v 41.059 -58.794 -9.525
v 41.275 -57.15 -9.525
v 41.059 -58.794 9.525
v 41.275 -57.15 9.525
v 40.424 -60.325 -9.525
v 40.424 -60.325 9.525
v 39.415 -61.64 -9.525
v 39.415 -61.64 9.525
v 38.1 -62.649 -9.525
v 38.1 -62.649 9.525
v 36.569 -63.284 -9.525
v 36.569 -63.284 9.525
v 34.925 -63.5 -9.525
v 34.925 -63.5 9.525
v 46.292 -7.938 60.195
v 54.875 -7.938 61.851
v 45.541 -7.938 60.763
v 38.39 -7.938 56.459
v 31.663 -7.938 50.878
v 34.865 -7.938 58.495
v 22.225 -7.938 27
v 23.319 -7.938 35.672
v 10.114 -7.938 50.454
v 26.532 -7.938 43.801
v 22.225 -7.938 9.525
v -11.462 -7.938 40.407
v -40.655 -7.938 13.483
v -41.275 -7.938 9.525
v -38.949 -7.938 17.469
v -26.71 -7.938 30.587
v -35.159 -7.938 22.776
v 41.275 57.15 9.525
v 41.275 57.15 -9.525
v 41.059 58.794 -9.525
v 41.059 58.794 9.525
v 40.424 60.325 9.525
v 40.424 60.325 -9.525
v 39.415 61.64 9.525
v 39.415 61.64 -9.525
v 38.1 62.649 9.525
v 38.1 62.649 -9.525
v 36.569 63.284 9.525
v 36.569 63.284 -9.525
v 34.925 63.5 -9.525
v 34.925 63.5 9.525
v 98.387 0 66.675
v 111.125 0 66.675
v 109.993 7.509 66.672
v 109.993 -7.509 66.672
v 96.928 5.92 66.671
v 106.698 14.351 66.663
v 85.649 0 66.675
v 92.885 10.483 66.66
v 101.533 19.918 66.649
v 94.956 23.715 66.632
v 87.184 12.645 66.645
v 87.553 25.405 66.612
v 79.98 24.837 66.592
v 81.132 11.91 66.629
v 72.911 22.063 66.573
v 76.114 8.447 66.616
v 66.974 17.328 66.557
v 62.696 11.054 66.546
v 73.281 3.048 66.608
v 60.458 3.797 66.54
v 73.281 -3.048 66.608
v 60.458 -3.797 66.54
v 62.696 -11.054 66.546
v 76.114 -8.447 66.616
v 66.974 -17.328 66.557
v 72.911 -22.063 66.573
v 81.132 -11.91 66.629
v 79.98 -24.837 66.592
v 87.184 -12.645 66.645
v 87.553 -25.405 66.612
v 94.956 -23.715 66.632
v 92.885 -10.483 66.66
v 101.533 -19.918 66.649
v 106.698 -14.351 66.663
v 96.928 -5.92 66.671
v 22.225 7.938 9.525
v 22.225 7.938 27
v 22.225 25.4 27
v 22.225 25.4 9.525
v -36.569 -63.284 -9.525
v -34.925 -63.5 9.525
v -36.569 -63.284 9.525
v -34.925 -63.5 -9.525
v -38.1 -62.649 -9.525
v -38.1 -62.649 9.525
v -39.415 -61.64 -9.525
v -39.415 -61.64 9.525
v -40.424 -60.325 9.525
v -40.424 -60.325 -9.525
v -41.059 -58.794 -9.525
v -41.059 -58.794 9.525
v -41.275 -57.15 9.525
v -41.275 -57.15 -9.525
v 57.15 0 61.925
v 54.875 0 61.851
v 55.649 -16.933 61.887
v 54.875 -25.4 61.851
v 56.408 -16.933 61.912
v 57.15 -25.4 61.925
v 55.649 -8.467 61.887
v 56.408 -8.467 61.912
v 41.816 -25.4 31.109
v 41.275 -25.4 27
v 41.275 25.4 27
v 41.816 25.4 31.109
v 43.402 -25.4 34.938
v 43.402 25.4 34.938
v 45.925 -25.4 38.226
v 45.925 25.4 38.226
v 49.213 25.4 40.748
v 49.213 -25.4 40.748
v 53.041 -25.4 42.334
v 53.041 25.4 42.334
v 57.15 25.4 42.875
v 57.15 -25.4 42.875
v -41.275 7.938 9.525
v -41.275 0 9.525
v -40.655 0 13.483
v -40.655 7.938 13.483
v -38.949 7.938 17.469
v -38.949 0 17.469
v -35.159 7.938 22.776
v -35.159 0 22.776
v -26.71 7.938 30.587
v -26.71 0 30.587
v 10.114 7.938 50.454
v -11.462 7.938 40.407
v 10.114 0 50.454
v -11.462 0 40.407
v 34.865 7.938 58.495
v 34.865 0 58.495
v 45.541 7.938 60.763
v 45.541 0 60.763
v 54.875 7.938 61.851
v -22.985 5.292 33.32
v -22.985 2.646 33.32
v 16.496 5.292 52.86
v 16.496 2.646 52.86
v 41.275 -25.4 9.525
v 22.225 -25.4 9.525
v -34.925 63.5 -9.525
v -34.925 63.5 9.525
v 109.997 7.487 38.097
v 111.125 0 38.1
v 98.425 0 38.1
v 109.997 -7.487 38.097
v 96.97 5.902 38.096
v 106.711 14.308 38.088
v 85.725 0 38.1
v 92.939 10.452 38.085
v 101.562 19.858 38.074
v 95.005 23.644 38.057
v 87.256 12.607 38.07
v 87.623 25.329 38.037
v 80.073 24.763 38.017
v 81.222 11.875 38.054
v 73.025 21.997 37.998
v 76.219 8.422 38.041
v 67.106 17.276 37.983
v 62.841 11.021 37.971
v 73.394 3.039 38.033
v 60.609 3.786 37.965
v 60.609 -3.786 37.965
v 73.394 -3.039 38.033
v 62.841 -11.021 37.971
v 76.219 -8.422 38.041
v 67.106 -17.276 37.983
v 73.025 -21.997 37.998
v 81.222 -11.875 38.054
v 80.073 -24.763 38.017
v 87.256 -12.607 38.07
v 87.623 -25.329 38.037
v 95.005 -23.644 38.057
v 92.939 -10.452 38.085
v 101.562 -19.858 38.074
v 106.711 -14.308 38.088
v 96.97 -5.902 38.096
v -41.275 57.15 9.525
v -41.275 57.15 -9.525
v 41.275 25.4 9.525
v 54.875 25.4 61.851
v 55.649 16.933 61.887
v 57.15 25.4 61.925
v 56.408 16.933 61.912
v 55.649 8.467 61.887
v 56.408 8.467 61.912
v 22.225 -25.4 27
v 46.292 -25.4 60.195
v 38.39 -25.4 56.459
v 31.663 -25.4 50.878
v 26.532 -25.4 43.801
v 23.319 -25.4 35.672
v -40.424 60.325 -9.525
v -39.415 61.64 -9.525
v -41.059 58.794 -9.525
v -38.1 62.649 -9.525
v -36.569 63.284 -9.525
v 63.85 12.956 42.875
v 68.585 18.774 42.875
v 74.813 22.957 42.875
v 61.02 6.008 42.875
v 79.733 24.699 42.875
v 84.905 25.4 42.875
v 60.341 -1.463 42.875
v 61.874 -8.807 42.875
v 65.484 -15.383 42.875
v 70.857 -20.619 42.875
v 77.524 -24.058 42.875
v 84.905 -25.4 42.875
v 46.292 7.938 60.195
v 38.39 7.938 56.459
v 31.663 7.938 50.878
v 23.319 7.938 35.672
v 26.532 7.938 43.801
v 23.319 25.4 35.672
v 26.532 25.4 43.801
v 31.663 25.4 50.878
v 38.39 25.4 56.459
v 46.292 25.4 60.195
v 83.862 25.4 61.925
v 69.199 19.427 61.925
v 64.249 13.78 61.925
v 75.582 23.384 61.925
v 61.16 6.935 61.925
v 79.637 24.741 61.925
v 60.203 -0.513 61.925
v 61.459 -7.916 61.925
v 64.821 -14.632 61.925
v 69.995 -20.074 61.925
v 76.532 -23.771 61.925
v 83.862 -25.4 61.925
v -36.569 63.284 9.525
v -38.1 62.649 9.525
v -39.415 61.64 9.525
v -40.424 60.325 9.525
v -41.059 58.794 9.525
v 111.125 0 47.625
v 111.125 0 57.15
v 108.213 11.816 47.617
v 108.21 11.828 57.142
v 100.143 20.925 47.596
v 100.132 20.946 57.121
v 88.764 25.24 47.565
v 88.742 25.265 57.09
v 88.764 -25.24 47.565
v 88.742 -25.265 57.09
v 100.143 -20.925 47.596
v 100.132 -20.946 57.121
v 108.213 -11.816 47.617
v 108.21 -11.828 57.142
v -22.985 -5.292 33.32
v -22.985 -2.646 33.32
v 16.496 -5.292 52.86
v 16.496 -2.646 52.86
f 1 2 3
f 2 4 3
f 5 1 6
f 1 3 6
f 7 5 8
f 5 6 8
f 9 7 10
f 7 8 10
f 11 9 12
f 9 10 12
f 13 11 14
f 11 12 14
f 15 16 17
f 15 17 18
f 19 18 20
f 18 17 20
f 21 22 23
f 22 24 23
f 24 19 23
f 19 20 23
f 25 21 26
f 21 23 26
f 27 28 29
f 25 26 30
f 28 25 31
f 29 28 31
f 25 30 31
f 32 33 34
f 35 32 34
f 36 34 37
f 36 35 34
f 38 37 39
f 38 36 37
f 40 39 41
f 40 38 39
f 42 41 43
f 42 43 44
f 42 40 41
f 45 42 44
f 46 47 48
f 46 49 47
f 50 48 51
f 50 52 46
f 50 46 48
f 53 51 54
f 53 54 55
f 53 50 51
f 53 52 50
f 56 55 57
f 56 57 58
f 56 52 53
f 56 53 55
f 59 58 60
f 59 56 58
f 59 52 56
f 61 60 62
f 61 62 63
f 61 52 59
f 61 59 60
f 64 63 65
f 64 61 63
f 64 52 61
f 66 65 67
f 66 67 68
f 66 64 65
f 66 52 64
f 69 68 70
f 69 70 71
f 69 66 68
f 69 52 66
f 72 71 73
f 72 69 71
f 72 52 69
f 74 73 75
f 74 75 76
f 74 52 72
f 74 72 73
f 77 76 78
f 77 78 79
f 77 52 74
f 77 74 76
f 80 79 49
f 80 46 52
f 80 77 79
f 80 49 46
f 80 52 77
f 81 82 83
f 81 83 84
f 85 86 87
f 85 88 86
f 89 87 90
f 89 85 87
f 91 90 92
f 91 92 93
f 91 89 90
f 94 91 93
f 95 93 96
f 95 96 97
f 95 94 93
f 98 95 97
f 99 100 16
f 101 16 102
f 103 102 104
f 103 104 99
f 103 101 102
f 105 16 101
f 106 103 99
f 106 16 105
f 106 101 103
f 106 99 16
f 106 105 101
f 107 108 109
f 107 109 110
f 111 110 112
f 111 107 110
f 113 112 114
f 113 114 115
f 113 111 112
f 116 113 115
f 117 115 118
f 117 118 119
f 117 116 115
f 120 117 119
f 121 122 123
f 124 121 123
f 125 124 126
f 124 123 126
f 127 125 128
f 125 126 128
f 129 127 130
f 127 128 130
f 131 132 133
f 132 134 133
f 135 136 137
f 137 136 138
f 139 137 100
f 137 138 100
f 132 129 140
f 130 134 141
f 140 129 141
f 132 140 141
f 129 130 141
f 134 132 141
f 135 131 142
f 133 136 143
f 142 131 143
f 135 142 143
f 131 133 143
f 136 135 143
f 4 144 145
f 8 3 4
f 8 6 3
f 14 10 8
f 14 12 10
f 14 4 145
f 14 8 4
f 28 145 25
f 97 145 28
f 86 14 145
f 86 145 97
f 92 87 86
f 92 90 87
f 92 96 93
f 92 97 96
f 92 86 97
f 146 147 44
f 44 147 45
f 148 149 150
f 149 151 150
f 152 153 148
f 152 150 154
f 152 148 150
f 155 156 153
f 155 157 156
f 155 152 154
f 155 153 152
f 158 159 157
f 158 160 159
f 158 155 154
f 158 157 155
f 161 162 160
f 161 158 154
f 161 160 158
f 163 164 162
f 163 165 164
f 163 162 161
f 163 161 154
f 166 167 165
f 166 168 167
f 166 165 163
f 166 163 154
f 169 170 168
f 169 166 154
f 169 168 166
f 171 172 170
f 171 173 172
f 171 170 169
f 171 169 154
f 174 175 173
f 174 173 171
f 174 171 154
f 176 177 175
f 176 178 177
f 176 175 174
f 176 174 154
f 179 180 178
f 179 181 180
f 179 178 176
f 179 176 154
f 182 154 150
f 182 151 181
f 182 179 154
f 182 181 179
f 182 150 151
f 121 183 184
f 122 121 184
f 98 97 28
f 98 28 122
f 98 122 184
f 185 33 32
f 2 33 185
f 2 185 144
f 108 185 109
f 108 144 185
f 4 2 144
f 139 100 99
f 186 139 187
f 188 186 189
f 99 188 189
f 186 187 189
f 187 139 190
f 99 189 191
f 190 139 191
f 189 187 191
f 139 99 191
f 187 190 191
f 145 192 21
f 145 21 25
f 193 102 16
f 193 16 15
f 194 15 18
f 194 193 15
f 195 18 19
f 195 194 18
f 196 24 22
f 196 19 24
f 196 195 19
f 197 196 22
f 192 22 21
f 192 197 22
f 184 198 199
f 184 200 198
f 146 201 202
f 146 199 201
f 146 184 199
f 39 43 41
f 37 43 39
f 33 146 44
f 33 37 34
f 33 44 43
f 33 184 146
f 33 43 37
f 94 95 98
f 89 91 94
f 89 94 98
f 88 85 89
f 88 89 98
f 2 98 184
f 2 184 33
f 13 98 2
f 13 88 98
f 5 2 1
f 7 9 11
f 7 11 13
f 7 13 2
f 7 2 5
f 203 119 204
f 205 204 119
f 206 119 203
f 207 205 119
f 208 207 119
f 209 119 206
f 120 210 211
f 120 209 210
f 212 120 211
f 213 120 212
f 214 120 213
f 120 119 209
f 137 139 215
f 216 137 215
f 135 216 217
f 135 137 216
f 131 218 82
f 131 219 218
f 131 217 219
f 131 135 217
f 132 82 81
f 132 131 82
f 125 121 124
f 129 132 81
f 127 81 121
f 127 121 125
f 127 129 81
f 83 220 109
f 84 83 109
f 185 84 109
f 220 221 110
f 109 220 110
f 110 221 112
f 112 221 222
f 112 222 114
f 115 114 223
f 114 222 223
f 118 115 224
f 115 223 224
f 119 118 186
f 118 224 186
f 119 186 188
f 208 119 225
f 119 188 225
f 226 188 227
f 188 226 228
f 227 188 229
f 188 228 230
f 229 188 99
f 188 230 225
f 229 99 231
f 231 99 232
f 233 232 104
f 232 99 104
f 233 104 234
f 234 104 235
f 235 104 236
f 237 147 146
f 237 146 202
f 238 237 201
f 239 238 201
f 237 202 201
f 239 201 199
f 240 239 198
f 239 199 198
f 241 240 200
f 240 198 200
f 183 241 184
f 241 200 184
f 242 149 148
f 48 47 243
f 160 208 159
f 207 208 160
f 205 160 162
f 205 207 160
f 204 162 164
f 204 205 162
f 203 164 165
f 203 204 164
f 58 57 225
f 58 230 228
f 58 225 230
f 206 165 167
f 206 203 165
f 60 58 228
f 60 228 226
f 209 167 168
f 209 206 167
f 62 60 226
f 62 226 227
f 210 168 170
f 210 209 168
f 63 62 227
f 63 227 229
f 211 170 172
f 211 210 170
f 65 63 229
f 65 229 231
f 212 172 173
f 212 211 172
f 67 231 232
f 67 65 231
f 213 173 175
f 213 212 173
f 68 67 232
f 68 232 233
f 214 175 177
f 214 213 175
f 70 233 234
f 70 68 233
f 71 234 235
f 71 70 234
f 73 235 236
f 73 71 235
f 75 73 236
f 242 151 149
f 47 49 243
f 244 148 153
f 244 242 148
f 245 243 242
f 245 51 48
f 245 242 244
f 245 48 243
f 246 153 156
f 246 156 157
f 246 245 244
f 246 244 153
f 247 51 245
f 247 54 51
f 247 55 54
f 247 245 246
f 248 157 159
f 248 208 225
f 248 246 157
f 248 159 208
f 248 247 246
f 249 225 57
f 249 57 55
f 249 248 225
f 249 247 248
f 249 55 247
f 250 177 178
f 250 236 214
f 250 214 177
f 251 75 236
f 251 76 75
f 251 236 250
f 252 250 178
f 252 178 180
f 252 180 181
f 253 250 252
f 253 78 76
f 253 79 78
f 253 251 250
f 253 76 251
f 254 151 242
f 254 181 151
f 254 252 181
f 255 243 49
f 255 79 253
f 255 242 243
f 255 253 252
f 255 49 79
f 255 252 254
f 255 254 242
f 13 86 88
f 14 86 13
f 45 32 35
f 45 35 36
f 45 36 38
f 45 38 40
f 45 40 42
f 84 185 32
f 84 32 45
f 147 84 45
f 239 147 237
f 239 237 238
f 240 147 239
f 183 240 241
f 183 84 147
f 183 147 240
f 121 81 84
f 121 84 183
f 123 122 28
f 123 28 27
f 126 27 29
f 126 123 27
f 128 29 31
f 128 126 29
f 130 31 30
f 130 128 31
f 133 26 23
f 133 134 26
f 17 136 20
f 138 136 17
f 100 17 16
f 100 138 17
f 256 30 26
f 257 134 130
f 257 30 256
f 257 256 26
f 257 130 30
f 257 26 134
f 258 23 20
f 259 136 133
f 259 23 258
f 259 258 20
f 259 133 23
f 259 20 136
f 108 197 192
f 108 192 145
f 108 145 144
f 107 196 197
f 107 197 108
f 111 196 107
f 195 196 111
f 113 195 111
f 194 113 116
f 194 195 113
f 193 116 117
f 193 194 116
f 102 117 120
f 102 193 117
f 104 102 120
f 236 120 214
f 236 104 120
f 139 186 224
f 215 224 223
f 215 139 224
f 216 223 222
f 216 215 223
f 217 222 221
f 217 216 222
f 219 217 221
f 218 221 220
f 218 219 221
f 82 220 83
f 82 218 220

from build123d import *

# Parameters (mm, degrees)
F1_DEPTH = 63.5
F2_DEPTH = 7.9375
F3_DEPTH = 25.4
F0_W     = 25.3238
F0_H     = 19.05
F4_DEPTH = 25.4
F6_R     = 6.35


with BuildPart() as f1:
    # F0 (on Front) → F1 (new body, symmetric)
    with BuildSketch(Plane.XZ):
        Polygon((-41.275, 9.525), (-41.275, -9.525), (41.275, -9.525), (41.275, 9.525), (22.225, 9.525), align=None)
    extrude(amount=F1_DEPTH, both=True)

    # F0 (on Front) → F2 (join, symmetric)
    with BuildSketch(Plane.XZ):
        with BuildLine():
            add(Edge.make_bspline(
                [(-41.275, 9.525), (-41.0096709394, 33.3485221213), (24.4764054446, 60.2335256768), (54.8747860488, 61.8510109874)],
                knots=[0, 0, 0, 0, 108.7072951775, 108.7072951775, 108.7072951775, 108.7072951775], degree=3))
            Line((-41.275, 9.525), (22.225, 9.525))
            Line((22.225, 9.525), (22.225, 27.0002))
            ThreePointArc((22.225, 27.0002), (31.6625769031, 50.8779488235), (54.8747860488, 61.8510109874))
        make_face()
    extrude(amount=F2_DEPTH, both=True)

    # F0 (on Front) → F3 (join, symmetric)
    with BuildSketch(Plane.XZ):
        with BuildLine():
            Line((22.225, 9.525), (41.275, 9.525))
            Line((41.275, 9.525), (41.275, 27.0002))
            ThreePointArc((41.275, 27.0002), (45.9246798487, 38.2255201513), (57.15, 42.8752))
            Line((57.15, 42.8752), (60.325, 42.8752))
            Line((60.325, 42.8752), (60.325, 61.9252))
            Line((60.325, 61.9252), (57.15, 61.9252))
            add(Edge.make_bspline(
                [(54.8747860488, 61.8510109874), (55.6569929467, 61.8926318942), (56.4159672755, 61.917522453), (57.15, 61.9252)],
                knots=[108.7072951775, 108.7072951775, 108.7072951775, 108.7072951775, 111.5045361635, 111.5045361635, 111.5045361635, 111.5045361635], degree=3))
            ThreePointArc((54.8747860488, 61.8510109874), (31.6625769031, 50.8779488235), (22.225, 27.0002))
            Line((22.225, 27.0002), (22.225, 9.525))
        make_face()
    extrude(amount=F3_DEPTH, both=True)

    # F0 (on Front) → F4 (join, symmetric)
    with BuildSketch(Plane.XZ):
        with Locations((72.9869, 52.4002)):
            Rectangle(F0_W, F0_H)
    extrude(amount=F4_DEPTH, both=True)

    # F0 (on Front) → F5 (revolve)
    with BuildSketch(Plane.XZ):
        Polygon((111.125, 66.675), (85.6488, 66.675), (85.725, 38.1), (111.125, 38.1), align=None)
    revolve(axis=Axis((85.6869, 0, 52.3875), (-0.0026666572, 0, 0.9999964445)))

    # F6
    f6_edges = [f1.edges().sort_by_distance(p)[0] for p in [
        (41.275, -63.5, 0),
        (41.275, 63.5, 0),
        (-41.275, 63.5, 0),
        (-41.275, -63.5, 0),
    ]]
    fillet(f6_edges, radius=F6_R)


solid = f1.part
